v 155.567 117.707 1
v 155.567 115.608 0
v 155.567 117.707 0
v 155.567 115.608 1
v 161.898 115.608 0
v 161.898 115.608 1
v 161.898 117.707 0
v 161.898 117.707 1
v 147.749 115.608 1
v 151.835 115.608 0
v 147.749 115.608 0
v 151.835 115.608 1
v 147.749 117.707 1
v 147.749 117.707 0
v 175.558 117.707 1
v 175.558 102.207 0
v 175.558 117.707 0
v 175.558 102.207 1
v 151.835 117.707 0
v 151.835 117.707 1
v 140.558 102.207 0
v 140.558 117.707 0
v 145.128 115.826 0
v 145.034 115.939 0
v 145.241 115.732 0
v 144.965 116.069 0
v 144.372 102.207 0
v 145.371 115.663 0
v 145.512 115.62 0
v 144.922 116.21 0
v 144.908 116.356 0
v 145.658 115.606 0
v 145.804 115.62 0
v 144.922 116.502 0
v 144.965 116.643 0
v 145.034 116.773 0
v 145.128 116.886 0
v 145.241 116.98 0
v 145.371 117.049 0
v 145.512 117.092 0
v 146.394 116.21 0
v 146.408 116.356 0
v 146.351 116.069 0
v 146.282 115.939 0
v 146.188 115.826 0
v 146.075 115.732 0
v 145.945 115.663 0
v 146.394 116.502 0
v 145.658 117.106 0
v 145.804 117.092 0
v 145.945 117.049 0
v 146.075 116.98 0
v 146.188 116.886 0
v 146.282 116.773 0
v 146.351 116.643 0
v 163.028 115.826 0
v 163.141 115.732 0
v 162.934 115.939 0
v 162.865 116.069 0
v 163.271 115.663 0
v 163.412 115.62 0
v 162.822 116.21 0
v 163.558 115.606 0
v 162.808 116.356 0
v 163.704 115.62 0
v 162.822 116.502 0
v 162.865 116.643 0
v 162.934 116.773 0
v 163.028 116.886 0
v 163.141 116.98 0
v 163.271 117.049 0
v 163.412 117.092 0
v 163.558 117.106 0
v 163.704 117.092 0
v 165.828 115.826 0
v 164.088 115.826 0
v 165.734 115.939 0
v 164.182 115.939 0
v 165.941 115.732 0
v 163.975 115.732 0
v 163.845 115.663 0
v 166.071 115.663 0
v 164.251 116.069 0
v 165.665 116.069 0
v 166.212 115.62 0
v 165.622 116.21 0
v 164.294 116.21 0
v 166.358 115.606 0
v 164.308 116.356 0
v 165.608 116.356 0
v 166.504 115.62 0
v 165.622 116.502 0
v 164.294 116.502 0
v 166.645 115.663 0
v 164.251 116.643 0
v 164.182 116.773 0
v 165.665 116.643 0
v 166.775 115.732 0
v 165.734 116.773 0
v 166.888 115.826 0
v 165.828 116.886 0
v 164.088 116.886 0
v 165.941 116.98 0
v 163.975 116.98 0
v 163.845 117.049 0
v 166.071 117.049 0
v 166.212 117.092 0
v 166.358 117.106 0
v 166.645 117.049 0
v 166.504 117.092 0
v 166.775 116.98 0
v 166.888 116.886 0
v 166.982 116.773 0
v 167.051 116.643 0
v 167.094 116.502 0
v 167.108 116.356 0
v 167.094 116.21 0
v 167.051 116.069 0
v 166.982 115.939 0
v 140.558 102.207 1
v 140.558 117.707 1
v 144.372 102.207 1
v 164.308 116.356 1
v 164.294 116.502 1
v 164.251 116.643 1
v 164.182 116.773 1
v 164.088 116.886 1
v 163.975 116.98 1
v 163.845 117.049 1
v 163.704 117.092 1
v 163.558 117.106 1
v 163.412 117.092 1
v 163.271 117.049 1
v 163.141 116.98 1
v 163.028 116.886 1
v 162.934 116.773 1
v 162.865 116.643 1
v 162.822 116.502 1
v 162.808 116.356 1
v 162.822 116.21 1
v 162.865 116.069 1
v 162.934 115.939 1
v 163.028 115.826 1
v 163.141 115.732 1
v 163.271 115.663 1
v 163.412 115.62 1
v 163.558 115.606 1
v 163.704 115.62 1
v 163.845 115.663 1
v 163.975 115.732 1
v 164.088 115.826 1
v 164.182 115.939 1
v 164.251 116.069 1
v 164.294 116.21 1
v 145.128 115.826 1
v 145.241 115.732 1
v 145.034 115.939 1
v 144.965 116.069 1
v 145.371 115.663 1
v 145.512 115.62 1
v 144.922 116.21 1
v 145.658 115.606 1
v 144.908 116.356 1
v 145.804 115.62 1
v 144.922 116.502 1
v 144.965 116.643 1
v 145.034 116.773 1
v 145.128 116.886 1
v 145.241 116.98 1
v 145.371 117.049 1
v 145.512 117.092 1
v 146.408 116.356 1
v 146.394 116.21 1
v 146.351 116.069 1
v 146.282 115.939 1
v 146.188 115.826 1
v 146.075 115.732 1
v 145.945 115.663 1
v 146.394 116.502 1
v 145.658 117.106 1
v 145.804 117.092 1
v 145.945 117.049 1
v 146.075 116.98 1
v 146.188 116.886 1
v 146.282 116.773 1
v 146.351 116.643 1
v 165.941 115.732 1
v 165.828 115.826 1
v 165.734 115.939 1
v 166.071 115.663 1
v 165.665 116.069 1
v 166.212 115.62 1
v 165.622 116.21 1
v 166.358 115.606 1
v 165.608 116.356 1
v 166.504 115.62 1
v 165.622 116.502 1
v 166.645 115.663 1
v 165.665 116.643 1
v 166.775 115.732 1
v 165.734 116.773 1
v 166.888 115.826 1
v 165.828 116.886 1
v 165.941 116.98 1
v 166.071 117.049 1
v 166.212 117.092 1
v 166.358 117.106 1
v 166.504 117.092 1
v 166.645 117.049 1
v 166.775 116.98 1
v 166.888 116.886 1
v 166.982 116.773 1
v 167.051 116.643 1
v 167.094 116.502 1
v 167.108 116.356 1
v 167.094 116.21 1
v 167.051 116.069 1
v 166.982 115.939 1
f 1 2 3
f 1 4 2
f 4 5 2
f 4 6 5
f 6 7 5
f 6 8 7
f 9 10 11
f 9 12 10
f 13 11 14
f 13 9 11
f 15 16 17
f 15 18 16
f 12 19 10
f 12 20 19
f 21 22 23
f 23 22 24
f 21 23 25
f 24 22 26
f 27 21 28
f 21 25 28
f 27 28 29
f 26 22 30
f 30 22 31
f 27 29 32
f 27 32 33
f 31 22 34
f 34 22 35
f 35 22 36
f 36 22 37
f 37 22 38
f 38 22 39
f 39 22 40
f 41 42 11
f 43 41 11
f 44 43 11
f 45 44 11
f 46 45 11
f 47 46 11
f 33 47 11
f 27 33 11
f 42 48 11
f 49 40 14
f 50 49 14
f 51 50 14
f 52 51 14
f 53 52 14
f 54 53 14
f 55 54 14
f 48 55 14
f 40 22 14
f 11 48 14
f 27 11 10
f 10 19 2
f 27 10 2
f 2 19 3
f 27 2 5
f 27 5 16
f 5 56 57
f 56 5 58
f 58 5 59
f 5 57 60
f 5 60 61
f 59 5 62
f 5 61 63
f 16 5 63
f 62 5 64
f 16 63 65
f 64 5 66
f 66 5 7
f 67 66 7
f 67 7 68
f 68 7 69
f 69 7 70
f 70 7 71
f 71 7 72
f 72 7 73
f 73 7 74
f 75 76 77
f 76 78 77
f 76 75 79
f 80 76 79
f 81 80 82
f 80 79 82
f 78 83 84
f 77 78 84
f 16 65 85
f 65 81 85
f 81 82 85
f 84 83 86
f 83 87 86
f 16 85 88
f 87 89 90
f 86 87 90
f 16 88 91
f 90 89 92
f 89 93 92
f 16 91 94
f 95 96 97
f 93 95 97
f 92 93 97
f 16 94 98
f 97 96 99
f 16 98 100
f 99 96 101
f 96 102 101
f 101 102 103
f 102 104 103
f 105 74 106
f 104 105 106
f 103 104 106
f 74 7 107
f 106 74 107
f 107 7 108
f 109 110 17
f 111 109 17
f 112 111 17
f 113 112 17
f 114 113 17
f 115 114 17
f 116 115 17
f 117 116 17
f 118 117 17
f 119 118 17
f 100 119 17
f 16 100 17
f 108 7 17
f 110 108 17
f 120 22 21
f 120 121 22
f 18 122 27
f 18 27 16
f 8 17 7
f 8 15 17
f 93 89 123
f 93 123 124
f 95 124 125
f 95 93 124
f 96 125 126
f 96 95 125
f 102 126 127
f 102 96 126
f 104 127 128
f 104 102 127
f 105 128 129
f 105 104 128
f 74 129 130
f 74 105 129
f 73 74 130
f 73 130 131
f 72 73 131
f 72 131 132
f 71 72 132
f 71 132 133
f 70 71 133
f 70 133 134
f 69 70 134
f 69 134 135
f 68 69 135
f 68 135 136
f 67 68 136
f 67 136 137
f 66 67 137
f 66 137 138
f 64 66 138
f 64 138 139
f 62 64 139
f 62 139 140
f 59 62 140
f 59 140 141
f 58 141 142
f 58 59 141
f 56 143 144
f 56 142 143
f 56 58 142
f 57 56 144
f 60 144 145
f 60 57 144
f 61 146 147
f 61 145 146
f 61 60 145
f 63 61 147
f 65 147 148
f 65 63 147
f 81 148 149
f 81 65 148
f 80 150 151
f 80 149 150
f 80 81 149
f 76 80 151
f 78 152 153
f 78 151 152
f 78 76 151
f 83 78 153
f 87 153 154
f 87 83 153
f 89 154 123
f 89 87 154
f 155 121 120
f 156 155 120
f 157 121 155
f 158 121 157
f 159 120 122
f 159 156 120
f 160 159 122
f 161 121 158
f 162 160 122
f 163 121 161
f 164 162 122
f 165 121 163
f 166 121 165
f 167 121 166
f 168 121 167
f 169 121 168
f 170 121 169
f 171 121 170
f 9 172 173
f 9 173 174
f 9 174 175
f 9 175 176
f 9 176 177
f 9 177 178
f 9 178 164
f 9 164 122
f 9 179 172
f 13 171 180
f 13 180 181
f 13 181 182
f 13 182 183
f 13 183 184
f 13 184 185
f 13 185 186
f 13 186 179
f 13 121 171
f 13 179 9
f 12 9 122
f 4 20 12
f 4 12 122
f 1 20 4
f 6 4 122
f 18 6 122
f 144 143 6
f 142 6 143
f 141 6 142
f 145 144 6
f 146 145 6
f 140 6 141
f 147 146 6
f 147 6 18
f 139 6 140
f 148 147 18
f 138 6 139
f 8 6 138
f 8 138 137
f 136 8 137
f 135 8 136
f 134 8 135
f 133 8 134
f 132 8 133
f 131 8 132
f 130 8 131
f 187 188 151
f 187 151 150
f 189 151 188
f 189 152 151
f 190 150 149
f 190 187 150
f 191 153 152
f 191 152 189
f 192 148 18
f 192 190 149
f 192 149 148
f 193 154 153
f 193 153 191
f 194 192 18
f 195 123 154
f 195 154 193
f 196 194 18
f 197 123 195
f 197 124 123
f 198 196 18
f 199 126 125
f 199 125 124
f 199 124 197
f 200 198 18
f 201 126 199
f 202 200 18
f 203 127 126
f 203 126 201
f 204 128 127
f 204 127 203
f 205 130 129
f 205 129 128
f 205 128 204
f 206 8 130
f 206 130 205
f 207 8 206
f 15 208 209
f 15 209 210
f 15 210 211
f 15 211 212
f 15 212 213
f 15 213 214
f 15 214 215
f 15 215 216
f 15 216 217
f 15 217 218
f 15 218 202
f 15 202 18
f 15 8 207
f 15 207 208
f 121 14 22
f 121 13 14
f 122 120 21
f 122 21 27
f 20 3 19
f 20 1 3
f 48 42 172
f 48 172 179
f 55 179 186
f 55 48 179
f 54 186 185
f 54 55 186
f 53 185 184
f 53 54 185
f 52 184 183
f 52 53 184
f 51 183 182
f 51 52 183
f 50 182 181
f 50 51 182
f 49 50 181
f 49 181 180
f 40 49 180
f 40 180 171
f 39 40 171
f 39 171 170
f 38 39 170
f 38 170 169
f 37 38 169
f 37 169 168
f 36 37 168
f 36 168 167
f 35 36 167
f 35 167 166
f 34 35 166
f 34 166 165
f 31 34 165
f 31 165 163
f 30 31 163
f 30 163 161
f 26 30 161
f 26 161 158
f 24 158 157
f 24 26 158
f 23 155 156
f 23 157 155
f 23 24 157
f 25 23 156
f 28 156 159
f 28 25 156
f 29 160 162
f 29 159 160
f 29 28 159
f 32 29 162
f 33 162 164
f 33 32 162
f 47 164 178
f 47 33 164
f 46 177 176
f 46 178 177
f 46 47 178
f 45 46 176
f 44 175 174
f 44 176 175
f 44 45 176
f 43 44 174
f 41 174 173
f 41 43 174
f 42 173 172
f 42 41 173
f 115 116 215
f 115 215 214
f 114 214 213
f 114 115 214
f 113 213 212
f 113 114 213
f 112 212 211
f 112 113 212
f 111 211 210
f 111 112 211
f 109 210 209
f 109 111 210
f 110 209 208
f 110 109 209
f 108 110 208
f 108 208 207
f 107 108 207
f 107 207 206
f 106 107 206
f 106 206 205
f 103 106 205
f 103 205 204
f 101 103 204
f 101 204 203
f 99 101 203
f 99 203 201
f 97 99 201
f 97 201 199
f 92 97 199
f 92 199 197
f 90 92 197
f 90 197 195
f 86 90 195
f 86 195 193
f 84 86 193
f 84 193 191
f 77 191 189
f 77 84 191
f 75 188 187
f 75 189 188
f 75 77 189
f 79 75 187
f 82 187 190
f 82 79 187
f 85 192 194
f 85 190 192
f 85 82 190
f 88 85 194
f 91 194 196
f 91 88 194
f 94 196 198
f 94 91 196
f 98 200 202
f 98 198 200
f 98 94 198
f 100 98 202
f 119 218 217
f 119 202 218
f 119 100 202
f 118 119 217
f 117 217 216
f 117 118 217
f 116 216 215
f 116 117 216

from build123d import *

# Parameters (mm, degrees)
BOSS_EXTRUDE3_DEPTH     = 1
CUT_EXTRUDE1_DEPTH      = 212.368278774
CUT_EXTRUDE1_DEPTH_BACK = 212.368278774
SKETCH3_R               = 0.75


with BuildPart() as part:
    # Boss-Extrude1: read off the stored shape, not the designer's step
    # Boss-Extrude1: loft between two sections, ruled curve by curve
    boss_extrude1_from = [
        Edge.make_line((175.558, 102.207, 0), (175.558, 117.707, 0)),
        Edge.make_line((175.558, 117.707, 0), (161.898, 117.707, 0)),
        Edge.make_line((161.898, 117.707, 0), (161.898, 115.608, 0)),
        Edge.make_line((161.898, 115.608, 0), (155.567, 115.608, 0)),
        Edge.make_line((155.567, 115.608, 0), (155.567, 117.707, 0)),
        Edge.make_line((155.567, 117.707, 0), (151.835, 117.707, 0)),
        Edge.make_line((151.835, 117.707, 0), (151.835, 115.608, 0)),
        Edge.make_line((151.835, 115.608, 0), (147.749, 115.608, 0)),
        Edge.make_line((147.749, 115.608, 0), (147.749, 117.707, 0)),
        Edge.make_line((147.749, 117.707, 0), (140.558, 117.707, 0)),
        Edge.make_line((140.558, 117.707, 0), (140.558, 102.207, 0)),
        Edge.make_line((140.558, 102.207, 0), (141.514, 102.2075, 0)),
        Edge.make_line((141.514, 102.2075, 0), (141.504, 102.212, 0)),
        Edge.make_line((141.504, 102.212, 0), (141.5, 102.222, 0)),
        Edge.make_line((141.5, 102.222, 0), (141.5, 106.293, 0)),
        Edge.make_line((141.5, 106.293, 0), (141.504, 106.303, 0)),
        Edge.make_line((141.504, 106.303, 0), (141.514, 106.307, 0)),
        Edge.make_line((141.514, 106.307, 0), (143.136, 106.307, 0)),
        Edge.make_line((143.136, 106.307, 0), (143.146, 106.303, 0)),
        Edge.make_line((143.146, 106.303, 0), (143.15, 106.293, 0)),
        Edge.make_line((143.15, 106.293, 0), (143.15, 102.222, 0)),
        Edge.make_line((143.15, 102.222, 0), (143.146, 102.212, 0)),
        Edge.make_line((143.146, 102.212, 0), (143.136, 102.2075, 0)),
        Edge.make_line((143.136, 102.2075, 0), (175.558, 102.207, 0)),
    ]
    boss_extrude1_to = [
        Edge.make_line((175.558, 102.207, 1), (175.558, 117.707, 1)),
        Edge.make_line((175.558, 117.707, 1), (161.898, 117.707, 1)),
        Edge.make_line((161.898, 117.707, 1), (161.898, 115.608, 1)),
        Edge.make_line((161.898, 115.608, 1), (155.567, 115.608, 1)),
        Edge.make_line((155.567, 115.608, 1), (155.567, 117.707, 1)),
        Edge.make_line((155.567, 117.707, 1), (151.835, 117.707, 1)),
        Edge.make_line((151.835, 117.707, 1), (151.835, 115.608, 1)),
        Edge.make_line((151.835, 115.608, 1), (147.749, 115.608, 1)),
        Edge.make_line((147.749, 115.608, 1), (147.749, 117.707, 1)),
        Edge.make_line((147.749, 117.707, 1), (140.558, 117.707, 1)),
        Edge.make_line((140.558, 117.707, 1), (140.558, 102.207, 1)),
        Edge.make_line((140.558, 102.207, 1), (141.514, 102.2075, 1)),
        Edge.make_line((141.514, 102.2075, 1), (141.504, 102.212, 1)),
        Edge.make_line((141.504, 102.212, 1), (141.5, 102.222, 1)),
        Edge.make_line((141.5, 102.222, 1), (141.5, 106.293, 1)),
        Edge.make_line((141.5, 106.293, 1), (141.504, 106.303, 1)),
        Edge.make_line((141.504, 106.303, 1), (141.514, 106.307, 1)),
        Edge.make_line((141.514, 106.307, 1), (143.136, 106.307, 1)),
        Edge.make_line((143.136, 106.307, 1), (143.146, 106.303, 1)),
        Edge.make_line((143.146, 106.303, 1), (143.15, 106.293, 1)),
        Edge.make_line((143.15, 106.293, 1), (143.15, 102.222, 1)),
        Edge.make_line((143.15, 102.222, 1), (143.146, 102.212, 1)),
        Edge.make_line((143.146, 102.212, 1), (143.136, 102.2075, 1)),
        Edge.make_line((143.136, 102.2075, 1), (175.558, 102.207, 1)),
    ]
    boss_extrude1 = Solid(Shell([*[Face.make_surface_from_curves(boss_extrude1_from[k], boss_extrude1_to[k]) for k in range(24)], Face(Wire(boss_extrude1_from)), Face(Wire(boss_extrude1_to))]))
    add(boss_extrude1)

    # Sketch2 → Boss-Extrude3 (add)
    with BuildSketch(Plane.XY.offset(1)):
        Polygon((140.906858982, 106.861348972), (140.558, 102.207), (144.371699547, 102.207480944), (144.371699547, 106.861348972), align=None)
    extrude(amount=-BOSS_EXTRUDE3_DEPTH)

    # Sketch3 → Cut-Extrude1 (cut, two sides: drawn at the far end of the back side and taken through both)
    with BuildSketch(Plane.XY.offset(1).offset(-CUT_EXTRUDE1_DEPTH_BACK)):
        with Locations((145.658, 116.356)):
            Circle(SKETCH3_R)
        with Locations((163.558, 116.356)):
            Circle(SKETCH3_R)
        with Locations((166.358, 116.356)):
            Circle(SKETCH3_R)
    extrude(amount=CUT_EXTRUDE1_DEPTH + CUT_EXTRUDE1_DEPTH_BACK, mode=Mode.SUBTRACT)


solid = part.part
